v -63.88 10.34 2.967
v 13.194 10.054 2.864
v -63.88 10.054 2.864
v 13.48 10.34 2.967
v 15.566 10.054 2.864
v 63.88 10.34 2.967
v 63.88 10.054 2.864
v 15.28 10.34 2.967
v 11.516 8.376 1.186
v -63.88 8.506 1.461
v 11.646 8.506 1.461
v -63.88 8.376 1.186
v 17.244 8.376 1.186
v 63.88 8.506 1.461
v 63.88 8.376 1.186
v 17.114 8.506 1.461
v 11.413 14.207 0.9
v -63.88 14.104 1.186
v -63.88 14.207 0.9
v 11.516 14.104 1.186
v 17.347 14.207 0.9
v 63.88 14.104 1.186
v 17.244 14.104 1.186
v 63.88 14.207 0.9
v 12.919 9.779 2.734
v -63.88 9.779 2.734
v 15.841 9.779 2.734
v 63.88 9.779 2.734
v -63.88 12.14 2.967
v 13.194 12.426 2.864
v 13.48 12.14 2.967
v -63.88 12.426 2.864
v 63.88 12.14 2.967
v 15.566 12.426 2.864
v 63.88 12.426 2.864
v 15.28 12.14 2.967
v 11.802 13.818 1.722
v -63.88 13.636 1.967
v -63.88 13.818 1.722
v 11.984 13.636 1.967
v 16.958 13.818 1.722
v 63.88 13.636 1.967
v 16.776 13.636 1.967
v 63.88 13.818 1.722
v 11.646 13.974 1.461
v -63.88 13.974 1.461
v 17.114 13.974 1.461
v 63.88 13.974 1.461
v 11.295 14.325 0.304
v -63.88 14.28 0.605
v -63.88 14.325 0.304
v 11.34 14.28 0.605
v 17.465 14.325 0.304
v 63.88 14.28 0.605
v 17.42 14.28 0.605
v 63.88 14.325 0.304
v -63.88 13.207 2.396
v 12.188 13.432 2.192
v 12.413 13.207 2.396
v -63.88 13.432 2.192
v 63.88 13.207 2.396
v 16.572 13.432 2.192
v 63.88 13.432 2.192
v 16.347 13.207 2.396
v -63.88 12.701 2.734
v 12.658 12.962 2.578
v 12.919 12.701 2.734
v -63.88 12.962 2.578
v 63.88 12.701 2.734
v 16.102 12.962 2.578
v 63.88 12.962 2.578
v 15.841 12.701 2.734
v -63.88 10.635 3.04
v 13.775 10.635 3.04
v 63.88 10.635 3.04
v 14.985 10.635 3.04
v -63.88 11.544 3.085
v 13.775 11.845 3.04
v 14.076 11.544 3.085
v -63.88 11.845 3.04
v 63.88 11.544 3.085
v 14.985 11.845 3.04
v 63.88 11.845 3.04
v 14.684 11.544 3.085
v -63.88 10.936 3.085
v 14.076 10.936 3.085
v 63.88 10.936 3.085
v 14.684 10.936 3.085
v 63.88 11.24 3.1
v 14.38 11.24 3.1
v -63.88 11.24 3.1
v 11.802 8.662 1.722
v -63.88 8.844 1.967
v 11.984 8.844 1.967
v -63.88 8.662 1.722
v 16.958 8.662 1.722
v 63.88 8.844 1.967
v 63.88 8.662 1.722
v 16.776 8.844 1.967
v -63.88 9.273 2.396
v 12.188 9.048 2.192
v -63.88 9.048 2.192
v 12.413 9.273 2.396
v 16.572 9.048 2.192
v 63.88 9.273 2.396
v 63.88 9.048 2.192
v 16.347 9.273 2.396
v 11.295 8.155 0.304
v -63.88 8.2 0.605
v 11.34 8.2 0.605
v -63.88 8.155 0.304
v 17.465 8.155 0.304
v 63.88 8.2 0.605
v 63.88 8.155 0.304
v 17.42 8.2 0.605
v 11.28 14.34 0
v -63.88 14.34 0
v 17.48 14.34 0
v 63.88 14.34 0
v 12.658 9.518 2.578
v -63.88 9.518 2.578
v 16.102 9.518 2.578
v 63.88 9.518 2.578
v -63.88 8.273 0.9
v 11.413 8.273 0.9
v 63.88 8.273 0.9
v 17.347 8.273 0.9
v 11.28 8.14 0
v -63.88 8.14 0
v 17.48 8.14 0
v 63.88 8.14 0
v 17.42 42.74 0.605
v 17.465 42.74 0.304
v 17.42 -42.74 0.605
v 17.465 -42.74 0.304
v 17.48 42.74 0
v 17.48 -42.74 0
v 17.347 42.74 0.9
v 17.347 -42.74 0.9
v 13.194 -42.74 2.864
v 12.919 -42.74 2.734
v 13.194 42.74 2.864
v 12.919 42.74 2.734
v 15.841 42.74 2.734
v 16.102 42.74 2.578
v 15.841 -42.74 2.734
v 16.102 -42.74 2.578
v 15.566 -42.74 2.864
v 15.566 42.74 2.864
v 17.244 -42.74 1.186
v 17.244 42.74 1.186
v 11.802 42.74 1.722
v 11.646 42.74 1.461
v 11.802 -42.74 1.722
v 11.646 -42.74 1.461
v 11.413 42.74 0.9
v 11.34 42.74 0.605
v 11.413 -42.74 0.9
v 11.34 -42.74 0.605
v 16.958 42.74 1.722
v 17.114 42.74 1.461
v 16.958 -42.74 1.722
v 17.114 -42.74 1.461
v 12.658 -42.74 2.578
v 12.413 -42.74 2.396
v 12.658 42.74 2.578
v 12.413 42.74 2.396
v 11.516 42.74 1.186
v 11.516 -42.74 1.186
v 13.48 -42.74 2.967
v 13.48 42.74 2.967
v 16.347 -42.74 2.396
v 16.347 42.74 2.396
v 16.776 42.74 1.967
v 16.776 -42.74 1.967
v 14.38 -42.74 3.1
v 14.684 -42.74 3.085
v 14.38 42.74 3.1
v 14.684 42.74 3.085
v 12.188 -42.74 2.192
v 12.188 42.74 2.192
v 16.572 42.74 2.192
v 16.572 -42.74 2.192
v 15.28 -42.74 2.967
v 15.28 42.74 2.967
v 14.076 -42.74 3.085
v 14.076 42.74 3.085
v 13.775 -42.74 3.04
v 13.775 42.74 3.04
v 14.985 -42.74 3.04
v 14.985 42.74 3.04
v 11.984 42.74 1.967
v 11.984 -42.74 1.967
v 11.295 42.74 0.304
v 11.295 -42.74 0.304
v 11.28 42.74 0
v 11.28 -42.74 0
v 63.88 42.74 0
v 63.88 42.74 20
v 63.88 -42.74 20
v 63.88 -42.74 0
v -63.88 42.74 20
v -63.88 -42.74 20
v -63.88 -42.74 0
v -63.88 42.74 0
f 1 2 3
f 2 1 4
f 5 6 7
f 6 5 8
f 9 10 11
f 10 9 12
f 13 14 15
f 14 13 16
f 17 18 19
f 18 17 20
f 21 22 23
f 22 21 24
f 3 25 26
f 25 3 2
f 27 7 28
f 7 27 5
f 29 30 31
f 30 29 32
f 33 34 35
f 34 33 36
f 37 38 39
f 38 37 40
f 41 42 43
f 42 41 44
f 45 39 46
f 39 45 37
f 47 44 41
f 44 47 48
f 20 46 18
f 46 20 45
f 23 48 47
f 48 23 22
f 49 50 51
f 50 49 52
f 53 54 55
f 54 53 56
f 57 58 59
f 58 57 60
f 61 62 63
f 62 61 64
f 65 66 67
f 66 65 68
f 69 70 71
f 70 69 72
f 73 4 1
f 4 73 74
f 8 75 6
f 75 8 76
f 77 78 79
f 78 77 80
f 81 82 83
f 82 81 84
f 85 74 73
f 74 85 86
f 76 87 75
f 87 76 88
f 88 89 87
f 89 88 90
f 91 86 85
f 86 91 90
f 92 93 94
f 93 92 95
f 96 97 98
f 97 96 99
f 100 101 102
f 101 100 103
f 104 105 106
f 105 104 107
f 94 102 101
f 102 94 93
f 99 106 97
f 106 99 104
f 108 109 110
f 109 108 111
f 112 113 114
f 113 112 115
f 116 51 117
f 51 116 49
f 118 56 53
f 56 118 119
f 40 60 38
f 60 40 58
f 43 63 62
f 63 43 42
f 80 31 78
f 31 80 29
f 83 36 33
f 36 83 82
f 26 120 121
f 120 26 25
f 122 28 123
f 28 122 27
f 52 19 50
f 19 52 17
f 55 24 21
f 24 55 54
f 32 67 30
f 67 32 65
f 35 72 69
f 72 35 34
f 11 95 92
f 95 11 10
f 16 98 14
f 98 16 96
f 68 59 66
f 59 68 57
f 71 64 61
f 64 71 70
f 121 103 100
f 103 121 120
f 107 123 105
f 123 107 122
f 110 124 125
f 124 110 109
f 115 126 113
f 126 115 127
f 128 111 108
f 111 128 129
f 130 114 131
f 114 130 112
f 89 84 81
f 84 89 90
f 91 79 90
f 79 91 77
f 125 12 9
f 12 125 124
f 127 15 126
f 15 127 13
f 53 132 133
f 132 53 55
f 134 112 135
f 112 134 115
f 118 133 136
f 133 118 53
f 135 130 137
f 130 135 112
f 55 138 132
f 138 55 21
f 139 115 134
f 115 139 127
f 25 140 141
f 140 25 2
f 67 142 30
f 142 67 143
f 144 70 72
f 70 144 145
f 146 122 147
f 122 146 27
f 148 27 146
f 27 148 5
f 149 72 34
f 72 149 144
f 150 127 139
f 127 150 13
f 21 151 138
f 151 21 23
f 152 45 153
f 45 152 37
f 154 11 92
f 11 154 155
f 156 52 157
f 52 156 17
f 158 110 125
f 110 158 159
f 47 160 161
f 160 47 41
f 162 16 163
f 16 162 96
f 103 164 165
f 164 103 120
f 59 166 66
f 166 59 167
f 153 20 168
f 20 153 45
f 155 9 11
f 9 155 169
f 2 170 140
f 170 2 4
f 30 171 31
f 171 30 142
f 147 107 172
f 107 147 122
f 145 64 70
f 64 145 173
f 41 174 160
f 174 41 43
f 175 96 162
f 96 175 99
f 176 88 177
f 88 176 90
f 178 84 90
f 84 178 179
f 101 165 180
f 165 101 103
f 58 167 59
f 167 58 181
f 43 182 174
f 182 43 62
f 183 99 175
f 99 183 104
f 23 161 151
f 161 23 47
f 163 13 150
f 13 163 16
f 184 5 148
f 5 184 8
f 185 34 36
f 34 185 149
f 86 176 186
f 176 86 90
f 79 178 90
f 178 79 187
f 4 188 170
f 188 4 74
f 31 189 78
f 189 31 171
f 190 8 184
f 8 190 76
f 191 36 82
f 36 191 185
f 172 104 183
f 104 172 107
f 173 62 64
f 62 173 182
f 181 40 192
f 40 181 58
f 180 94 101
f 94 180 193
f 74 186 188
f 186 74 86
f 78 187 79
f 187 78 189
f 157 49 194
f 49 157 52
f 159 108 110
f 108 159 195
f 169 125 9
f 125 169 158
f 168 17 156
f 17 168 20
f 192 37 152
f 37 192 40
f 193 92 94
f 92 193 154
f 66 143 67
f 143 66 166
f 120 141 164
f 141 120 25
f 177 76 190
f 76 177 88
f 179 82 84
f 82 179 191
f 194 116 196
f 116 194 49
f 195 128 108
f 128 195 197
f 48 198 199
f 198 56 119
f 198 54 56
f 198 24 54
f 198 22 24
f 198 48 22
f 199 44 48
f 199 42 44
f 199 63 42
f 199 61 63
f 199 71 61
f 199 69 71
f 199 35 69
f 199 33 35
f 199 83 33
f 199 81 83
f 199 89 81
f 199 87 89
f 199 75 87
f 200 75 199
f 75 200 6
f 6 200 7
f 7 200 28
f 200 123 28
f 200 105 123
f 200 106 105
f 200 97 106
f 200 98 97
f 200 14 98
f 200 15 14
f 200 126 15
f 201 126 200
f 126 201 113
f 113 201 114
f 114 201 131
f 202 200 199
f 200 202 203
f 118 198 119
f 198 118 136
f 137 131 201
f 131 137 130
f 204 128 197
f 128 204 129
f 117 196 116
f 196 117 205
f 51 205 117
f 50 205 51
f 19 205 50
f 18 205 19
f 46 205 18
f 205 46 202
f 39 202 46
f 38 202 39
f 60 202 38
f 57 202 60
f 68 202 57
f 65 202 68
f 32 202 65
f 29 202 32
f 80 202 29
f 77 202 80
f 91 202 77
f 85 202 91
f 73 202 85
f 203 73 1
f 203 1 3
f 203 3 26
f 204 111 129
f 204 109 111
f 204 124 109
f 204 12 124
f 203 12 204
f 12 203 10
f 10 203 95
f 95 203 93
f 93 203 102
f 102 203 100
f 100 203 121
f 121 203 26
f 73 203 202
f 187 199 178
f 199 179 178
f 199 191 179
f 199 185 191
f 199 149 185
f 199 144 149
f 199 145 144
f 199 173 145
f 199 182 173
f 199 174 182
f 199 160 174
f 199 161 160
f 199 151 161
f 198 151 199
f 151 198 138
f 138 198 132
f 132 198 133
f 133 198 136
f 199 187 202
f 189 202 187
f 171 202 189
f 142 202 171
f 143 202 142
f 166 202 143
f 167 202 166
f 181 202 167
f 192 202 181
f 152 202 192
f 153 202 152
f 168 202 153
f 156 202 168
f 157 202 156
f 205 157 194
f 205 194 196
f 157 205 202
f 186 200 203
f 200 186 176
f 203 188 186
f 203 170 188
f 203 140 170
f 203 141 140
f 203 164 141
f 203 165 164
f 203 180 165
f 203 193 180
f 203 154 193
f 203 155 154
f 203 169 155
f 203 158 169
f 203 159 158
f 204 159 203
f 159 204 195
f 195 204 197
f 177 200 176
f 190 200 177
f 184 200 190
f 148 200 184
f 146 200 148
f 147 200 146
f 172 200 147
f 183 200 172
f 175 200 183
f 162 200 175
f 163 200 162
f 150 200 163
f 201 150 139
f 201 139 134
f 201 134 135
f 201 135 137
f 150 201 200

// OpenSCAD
// Built by bench/smallmodels/features/compiler.py from a list of features.
$fn = 64;
difference() {
  union() {
    translate([0, 0, 0]) translate([-63.88, -42.74, 0]) cube([127.76, 85.48, 20]);
  }
  union() {
    translate([14.38, 11.24, 0]) rotate([0, 0, 0]) rotate([0, 90, 0]) cylinder(d = 6.2, h = 1080, center = true);
    translate([14.38, 11.24, 0]) rotate([0, 0, 0]) rotate([90, 0, 0]) cylinder(d = 6.2, h = 1080, center = true);
  }
}
